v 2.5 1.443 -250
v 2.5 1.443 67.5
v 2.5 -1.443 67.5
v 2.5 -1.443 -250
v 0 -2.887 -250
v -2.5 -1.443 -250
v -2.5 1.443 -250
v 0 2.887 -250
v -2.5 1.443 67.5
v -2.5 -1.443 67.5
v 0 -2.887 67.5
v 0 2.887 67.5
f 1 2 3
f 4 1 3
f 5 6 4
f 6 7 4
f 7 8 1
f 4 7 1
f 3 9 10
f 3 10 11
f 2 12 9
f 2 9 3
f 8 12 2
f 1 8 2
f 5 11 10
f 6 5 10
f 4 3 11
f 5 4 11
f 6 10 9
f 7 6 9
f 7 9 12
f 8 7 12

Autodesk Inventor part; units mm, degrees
ref_plane "YZ Plane" through (0, 0, 0) normal (1, 0, 0) x (0, 1, 0)
ref_plane "XZ Plane" through (0, 0, 0) normal (0, 1, 0) x (-1, 0, 0)
ref_plane "XY Plane" through (0, 0, 0) normal (0, 0, 1) x (1, 0, 0)
sketch "Sketch1" plane through (-2.1, -1.2124, 67.5) normal (0, 0, 1) x (1, 0, 0)
  line L0 (2.1, 4.0992) -> (4.6, 2.6558) projected
  line L1 (2.1, 3.6373) -> (0, 2.4249) projected
  line L2 (-0.4, 2.6558) -> (2.1, 4.0992) projected
  line L3 (-0.4, -0.2309) -> (-0.4, 2.6558) projected
  line L4 (2.1, -1.6743) -> (-0.4, -0.2309) projected
  line L5 (4.6, -0.2309) -> (2.1, -1.6743) projected
  line L6 (4.6, 2.6558) -> (4.6, -0.2309) projected
  point P0 (2.1, 1.2124)
extrude "Extrusion1" add sketch "Sketch1" against normal blind 317.5
sketch "Sketch2" plane through (-2.1, -1.2124, -250) normal (0, 0, -1) x (1, 0, 0)
  point P0 (2.1, -1.2124)
  point P1 (2.1, -1.2124)
properties part number "5mm axel"
